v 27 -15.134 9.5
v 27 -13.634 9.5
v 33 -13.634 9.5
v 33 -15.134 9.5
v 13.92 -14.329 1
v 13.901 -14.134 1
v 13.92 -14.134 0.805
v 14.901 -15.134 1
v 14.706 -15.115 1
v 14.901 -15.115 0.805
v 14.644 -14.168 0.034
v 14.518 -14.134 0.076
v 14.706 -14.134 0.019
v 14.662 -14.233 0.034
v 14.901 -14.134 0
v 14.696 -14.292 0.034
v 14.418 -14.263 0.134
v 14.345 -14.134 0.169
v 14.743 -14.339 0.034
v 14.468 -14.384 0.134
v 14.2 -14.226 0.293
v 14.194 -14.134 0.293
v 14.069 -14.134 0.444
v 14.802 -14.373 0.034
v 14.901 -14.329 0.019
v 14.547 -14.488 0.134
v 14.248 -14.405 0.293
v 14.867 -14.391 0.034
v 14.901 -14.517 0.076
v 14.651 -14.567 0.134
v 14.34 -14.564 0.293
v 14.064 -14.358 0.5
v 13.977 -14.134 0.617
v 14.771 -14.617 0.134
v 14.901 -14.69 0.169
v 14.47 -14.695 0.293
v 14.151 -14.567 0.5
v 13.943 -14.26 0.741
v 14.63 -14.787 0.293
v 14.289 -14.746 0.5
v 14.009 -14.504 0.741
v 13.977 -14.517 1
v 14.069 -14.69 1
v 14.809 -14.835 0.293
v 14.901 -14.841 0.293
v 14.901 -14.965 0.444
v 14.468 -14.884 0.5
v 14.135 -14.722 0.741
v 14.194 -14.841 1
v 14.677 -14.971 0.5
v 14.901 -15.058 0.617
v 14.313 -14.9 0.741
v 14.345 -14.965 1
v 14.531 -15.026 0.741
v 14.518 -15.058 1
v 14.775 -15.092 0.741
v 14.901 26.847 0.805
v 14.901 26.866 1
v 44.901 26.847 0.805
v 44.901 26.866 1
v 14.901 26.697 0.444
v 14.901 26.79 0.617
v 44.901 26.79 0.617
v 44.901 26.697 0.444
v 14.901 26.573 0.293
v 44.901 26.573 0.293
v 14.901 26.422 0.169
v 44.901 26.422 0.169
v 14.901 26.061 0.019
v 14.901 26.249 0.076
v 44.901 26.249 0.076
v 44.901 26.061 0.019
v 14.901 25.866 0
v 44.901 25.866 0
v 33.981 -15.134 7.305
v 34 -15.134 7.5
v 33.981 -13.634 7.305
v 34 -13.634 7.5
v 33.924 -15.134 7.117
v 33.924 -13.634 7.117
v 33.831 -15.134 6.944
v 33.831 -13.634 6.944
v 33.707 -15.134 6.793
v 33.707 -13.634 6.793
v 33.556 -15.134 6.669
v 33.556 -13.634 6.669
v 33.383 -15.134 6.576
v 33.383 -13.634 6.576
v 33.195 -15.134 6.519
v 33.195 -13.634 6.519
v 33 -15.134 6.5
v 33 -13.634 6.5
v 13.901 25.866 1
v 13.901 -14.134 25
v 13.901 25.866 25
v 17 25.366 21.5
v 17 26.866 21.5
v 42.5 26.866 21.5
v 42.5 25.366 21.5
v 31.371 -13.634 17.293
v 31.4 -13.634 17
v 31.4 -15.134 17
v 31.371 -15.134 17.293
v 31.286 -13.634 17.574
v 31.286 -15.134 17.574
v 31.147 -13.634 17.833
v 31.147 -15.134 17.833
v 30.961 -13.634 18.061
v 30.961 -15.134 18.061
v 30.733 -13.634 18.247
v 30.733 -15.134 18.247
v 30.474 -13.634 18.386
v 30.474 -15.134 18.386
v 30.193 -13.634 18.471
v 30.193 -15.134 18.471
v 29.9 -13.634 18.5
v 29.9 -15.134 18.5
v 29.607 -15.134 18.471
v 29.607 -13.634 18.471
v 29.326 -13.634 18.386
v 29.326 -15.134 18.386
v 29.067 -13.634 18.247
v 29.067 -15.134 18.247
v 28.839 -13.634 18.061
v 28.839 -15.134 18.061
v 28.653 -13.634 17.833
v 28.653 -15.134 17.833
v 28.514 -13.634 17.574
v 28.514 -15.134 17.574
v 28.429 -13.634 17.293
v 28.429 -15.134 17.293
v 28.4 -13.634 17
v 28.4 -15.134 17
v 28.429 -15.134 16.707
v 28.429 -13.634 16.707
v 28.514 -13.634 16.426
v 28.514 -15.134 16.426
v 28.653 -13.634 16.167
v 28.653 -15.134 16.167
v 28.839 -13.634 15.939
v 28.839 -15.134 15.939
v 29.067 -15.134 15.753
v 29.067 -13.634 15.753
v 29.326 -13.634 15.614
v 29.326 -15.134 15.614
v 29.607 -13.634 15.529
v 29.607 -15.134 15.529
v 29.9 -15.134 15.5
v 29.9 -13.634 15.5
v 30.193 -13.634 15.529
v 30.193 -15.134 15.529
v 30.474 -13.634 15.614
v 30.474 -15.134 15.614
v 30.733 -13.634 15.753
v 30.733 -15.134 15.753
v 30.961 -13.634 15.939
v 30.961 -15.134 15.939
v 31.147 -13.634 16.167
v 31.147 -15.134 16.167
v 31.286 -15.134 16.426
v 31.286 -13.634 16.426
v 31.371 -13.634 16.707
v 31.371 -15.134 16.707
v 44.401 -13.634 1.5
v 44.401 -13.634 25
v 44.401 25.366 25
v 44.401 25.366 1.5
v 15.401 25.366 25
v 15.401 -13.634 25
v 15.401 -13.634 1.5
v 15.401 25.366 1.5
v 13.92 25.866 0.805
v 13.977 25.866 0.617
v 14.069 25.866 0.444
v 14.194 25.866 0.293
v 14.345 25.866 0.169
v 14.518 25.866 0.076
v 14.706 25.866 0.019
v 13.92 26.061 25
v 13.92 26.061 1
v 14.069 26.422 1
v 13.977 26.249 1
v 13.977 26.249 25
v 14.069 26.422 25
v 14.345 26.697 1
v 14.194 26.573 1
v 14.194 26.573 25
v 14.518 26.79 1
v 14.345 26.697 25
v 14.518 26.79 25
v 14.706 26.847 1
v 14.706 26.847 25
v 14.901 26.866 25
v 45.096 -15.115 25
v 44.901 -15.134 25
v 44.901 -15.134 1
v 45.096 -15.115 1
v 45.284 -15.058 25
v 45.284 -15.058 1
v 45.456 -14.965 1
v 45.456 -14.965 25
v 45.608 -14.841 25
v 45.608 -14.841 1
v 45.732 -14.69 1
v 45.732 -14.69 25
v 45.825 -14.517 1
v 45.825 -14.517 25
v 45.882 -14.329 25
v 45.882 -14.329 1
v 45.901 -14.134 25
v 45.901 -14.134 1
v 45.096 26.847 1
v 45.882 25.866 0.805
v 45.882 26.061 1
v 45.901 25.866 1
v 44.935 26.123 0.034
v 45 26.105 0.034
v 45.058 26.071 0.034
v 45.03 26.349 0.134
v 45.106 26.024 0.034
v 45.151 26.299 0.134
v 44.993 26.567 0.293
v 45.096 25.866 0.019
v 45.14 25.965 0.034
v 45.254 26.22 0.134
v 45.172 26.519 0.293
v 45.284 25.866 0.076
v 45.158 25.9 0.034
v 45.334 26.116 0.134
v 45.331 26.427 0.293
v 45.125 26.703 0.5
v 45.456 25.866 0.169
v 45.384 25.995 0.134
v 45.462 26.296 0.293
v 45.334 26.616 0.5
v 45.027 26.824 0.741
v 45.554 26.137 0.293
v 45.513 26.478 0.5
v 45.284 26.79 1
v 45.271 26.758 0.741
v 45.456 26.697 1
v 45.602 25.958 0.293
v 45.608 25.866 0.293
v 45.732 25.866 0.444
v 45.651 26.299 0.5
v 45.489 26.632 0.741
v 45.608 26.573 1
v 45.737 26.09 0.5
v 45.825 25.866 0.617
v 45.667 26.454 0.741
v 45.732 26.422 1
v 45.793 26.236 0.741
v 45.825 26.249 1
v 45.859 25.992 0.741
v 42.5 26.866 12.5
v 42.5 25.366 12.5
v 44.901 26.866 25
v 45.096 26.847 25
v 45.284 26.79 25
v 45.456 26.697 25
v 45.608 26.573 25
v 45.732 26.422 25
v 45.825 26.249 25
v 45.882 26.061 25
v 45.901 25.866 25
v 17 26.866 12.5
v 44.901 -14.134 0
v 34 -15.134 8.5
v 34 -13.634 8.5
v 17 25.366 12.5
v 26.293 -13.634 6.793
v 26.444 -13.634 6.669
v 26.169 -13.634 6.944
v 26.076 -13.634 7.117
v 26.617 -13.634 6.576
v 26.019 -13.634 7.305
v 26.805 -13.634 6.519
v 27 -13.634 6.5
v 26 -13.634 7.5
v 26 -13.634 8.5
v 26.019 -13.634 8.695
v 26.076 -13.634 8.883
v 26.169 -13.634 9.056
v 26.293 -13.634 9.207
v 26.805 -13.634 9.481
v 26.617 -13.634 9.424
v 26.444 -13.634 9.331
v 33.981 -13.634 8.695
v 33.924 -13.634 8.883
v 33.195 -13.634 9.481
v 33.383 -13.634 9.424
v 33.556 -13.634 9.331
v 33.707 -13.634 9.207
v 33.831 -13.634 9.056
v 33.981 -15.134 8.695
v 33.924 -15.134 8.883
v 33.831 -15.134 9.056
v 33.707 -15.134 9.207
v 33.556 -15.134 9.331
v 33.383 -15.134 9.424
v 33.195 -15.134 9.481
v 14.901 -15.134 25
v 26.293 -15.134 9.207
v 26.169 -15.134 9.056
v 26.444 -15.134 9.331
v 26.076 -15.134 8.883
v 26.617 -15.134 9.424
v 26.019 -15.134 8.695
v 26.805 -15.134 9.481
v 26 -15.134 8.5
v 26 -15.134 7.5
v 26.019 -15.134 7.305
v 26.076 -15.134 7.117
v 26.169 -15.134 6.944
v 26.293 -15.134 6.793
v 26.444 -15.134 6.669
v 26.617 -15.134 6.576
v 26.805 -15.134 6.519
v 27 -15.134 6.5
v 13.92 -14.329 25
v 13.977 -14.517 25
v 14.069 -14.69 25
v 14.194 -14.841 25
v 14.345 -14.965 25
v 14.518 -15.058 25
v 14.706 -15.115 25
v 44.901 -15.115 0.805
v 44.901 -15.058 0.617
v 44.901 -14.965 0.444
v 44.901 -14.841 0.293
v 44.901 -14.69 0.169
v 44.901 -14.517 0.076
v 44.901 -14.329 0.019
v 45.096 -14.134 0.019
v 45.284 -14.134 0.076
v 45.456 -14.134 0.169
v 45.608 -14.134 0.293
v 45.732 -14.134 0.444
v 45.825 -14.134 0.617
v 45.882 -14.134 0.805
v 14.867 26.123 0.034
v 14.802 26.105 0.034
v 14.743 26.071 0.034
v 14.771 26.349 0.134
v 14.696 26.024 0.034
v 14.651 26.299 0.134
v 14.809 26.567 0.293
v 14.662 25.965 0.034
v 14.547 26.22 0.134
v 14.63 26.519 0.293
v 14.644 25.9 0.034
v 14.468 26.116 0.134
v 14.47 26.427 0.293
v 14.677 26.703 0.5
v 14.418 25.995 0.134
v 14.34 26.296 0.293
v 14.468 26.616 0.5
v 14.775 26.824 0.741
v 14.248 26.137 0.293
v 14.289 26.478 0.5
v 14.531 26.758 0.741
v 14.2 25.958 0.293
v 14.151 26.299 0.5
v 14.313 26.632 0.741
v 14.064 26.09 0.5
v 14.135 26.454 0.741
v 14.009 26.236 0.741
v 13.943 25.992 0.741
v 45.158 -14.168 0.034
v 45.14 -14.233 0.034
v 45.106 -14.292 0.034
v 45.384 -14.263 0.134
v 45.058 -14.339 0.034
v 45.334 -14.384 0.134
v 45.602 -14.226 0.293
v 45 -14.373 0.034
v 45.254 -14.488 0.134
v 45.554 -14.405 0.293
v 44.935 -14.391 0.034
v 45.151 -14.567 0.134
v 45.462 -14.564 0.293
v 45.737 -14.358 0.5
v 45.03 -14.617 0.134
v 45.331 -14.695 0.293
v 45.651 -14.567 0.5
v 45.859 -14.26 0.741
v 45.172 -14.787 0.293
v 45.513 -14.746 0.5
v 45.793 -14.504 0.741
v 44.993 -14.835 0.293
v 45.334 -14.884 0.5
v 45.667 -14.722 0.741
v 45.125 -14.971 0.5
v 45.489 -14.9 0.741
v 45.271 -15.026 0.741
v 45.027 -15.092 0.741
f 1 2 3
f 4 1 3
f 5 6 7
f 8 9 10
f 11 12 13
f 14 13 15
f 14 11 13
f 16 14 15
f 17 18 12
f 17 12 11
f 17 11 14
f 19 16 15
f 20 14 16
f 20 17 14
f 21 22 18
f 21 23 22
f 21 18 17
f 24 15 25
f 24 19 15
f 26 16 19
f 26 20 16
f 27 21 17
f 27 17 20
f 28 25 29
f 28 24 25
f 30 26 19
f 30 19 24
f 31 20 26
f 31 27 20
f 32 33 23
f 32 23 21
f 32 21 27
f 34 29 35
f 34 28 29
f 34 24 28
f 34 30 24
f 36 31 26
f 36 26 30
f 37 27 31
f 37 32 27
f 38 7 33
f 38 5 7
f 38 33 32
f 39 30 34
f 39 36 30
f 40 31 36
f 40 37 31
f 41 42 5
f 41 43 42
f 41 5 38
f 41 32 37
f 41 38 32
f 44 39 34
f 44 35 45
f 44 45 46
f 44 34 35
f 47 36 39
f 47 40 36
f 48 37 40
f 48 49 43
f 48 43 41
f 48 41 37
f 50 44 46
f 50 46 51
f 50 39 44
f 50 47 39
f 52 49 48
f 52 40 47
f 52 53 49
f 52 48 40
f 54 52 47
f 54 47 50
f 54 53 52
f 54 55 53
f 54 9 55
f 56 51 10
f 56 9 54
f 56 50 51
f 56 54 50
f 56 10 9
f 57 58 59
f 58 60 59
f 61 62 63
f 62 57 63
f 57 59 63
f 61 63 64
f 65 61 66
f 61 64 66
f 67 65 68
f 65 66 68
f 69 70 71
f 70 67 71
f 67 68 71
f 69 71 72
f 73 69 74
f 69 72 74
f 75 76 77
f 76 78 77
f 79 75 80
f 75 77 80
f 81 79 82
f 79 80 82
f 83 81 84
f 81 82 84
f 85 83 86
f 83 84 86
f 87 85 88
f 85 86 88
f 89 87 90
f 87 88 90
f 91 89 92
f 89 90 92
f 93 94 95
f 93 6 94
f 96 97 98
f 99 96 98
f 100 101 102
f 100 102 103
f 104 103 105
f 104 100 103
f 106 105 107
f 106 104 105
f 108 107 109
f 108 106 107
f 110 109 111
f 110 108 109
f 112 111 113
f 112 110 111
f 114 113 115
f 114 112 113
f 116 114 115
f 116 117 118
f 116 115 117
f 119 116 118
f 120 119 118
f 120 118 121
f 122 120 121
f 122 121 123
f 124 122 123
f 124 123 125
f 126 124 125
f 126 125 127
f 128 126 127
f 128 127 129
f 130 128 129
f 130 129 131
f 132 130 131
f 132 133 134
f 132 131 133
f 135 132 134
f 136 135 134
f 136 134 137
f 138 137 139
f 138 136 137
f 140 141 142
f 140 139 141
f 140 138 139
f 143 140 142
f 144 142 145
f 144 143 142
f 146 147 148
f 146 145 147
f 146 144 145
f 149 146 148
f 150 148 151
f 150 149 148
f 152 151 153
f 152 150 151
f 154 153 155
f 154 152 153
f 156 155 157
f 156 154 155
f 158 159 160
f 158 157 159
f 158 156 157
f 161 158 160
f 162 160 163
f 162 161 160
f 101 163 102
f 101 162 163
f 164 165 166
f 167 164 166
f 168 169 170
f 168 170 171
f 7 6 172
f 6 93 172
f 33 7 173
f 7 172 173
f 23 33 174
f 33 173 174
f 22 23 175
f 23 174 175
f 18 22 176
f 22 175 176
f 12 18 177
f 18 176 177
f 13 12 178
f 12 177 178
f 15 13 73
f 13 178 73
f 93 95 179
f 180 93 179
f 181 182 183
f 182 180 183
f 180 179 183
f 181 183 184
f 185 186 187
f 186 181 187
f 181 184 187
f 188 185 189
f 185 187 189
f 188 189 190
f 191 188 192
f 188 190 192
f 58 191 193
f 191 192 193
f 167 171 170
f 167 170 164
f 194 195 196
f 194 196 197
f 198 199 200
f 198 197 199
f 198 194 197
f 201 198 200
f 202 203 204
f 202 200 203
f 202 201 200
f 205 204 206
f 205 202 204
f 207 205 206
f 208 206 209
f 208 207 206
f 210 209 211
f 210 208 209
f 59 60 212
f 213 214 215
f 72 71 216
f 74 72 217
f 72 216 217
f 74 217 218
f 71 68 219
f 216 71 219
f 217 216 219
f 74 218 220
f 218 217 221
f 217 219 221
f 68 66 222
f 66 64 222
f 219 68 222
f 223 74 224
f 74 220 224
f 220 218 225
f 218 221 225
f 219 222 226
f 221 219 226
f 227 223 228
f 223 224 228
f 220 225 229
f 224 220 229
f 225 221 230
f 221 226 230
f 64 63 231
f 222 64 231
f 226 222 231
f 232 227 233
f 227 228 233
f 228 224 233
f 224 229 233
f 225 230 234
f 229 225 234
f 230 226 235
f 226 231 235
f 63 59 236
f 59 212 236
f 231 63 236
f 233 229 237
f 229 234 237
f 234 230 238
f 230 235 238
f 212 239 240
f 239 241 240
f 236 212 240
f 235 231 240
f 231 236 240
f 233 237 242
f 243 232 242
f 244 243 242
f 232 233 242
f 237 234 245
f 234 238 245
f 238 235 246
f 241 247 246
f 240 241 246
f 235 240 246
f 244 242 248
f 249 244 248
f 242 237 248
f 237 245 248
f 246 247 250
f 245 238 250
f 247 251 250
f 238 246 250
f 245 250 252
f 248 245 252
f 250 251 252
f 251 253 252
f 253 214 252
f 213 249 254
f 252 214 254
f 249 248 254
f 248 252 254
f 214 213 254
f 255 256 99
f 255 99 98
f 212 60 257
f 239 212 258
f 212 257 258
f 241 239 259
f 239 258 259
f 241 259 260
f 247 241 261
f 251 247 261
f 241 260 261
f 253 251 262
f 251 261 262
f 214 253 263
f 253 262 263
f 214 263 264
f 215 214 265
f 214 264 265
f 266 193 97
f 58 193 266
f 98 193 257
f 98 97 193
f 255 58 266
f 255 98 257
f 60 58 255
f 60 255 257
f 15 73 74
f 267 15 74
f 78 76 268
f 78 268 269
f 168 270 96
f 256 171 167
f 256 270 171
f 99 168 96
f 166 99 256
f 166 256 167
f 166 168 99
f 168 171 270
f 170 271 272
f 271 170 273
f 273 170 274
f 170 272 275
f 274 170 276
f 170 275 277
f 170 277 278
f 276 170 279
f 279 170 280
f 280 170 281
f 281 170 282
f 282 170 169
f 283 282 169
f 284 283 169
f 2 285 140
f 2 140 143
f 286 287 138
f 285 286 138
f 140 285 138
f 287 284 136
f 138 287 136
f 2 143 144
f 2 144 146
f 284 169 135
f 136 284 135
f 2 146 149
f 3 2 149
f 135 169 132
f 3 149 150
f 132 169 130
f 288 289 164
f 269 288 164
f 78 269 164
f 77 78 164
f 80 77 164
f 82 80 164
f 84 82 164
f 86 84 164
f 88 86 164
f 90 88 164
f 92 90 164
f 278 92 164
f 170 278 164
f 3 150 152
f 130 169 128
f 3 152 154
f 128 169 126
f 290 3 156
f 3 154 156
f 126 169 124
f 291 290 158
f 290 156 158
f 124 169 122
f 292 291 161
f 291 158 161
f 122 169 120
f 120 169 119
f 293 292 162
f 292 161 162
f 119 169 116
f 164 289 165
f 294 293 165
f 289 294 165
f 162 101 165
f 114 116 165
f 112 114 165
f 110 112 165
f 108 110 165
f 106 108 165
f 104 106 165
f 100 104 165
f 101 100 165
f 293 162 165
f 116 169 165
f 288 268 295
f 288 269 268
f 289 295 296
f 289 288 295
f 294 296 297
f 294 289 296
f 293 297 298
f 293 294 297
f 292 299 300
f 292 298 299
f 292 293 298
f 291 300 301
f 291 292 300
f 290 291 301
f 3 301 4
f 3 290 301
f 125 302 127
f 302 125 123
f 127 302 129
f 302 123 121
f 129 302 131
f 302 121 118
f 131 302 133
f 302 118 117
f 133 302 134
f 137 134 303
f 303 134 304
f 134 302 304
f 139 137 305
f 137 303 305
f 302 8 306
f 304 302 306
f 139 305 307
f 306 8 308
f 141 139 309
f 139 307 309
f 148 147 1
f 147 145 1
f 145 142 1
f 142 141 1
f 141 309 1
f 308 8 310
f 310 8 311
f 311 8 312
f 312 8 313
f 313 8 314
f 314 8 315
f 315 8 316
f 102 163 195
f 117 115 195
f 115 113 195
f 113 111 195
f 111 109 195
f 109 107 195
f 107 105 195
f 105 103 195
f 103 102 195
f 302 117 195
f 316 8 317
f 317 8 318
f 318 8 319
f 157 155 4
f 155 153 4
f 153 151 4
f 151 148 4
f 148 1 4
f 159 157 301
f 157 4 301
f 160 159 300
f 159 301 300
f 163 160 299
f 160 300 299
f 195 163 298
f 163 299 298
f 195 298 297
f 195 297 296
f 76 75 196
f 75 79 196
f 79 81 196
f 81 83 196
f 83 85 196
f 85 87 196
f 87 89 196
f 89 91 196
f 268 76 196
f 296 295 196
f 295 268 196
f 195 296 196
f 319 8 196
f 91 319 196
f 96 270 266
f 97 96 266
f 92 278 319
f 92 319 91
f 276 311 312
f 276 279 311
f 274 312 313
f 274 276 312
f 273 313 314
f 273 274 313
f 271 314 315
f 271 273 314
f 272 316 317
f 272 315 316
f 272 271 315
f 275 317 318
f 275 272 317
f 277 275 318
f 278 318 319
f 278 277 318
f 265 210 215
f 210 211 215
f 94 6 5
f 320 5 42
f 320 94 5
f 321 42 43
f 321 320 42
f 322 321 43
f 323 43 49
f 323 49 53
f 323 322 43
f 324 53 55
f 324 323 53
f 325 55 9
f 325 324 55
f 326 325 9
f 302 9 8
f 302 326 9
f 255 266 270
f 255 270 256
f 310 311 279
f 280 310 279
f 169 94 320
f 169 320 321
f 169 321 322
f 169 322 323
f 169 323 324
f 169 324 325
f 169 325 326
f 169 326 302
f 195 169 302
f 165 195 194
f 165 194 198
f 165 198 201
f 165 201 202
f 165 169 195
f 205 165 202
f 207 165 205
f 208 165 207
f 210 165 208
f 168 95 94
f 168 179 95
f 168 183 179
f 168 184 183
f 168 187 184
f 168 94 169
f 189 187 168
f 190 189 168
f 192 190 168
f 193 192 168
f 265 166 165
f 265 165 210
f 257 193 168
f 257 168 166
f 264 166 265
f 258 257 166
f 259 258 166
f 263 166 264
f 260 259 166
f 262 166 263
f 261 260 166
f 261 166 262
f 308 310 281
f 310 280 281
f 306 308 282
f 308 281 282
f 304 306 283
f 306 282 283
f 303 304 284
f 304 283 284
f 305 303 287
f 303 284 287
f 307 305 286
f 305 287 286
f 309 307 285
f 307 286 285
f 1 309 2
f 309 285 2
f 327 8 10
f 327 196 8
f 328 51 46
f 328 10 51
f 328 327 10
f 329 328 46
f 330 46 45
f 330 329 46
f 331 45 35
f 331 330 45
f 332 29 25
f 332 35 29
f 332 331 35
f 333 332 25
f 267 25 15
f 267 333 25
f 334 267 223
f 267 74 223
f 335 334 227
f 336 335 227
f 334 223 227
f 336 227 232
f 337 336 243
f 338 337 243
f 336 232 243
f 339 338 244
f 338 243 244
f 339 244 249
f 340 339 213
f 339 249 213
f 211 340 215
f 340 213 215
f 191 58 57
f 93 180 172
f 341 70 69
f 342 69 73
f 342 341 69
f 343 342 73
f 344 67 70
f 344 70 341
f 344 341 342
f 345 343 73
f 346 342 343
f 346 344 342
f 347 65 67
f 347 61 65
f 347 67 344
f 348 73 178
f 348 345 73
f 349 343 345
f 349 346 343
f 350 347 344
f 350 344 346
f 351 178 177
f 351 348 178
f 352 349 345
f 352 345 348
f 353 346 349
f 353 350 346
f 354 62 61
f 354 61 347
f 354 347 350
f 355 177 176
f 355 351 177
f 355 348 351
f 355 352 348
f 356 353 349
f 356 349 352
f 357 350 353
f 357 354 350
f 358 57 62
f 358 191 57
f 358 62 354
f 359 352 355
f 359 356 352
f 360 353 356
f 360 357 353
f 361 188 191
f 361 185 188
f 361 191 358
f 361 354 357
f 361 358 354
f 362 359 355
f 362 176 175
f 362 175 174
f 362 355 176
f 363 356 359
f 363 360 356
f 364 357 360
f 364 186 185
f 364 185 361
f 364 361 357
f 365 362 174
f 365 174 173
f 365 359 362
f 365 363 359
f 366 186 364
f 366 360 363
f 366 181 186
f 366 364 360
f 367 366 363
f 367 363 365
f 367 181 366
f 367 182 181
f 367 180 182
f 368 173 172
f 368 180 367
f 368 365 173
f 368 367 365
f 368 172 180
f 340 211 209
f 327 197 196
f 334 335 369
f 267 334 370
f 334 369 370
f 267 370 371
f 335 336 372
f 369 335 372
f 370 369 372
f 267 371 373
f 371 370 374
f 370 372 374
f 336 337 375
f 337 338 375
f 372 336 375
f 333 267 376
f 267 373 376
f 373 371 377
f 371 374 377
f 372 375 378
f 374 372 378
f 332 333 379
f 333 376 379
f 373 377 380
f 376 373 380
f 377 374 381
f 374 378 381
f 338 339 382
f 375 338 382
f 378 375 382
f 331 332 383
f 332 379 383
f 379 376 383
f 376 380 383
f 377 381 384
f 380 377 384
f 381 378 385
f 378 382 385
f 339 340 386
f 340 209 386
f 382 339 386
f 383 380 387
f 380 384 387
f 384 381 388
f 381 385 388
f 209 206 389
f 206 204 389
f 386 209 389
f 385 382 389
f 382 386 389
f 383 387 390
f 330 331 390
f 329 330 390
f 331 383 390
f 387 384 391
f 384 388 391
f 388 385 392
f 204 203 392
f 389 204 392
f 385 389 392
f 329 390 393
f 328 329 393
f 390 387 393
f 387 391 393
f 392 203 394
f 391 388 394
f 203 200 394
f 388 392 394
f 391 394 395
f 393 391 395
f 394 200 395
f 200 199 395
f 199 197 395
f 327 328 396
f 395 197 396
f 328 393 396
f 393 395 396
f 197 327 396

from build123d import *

# Parameters (mm, degrees)
BOX003_W            = 8
BOX003_H            = 6
BOX003_DEPTH        = 3
FILLET003_R         = 1
BOX004_W            = 25.5
BOX004_H            = 5
BOX004_DEPTH        = 9
CYLINDER_R          = 1.5
CYLINDER_DEPTH      = 3.5
CYLINDER_ROLL_ANGLE = 90
SKETCH_W            = 32
SKETCH_H            = 42
PAD_DEPTH           = 25
SKETCH001_W         = 29
SKETCH001_H         = 39
POCKET_DEPTH        = 23.5
FILLET001_R         = 1


with BuildPart() as fillet003:
    # Box003 → Box003 (new body)
    with BuildSketch(Plane(origin=(26, -16, 6.5), x_dir=(1, 0, 0), z_dir=(0, 0, 1))):
        with Locations((4, 3)):
            Rectangle(BOX003_W, BOX003_H)
    extrude(amount=BOX003_DEPTH)

    # Fillet003
    fillet003_edges = [fillet003.edges().sort_by_distance(p)[0] for p in [
        (26, -16, 8),
        (26, -13, 9.5),
        (26, -10, 8),
        (26, -13, 6.5),
        (34, -16, 8),
        (34, -13, 9.5),
        (34, -10, 8),
        (34, -13, 6.5),
        (30, -16, 6.5),
        (30, -16, 9.5),
        (30, -10, 6.5),
        (30, -10, 9.5),
    ]]
    fillet(fillet003_edges, radius=FILLET003_R)


with BuildPart() as fillet003_1:
    # Fillet003 placement: moved
    add(fillet003.part.moved(Location((0, -1, 0))))


with BuildPart() as cubo001:
    # Box004 → Box004 (new body)
    with BuildSketch(Plane(origin=(17, 24, 12.5), x_dir=(1, 0, 0), z_dir=(0, 0, 1))):
        with Locations((12.75, 2.5)):
            Rectangle(BOX004_W, BOX004_H)
    extrude(amount=BOX004_DEPTH)


with BuildPart() as holes:
    # Cylinder → Cylinder (new body)
    with BuildSketch(Plane.XY):
        Circle(CYLINDER_R)
    extrude(amount=CYLINDER_DEPTH)


with BuildPart() as holes_1:
    # Cylinder roll: moved
    add(holes.part.rotate(Axis((0, 0, 0), (1, 0, 0)), CYLINDER_ROLL_ANGLE))


with BuildPart() as holes_2:
    # Cylinder placement: moved
    add(holes_1.part.moved(Location((29.9, -12.65, 17))))

    # Fusion001: union Fillet003, Cubo001
    add(fillet003_1.part)
    add(cubo001.part)


with BuildPart() as cabinet_drilled:
    # Sketch → Pad (new body)
    with BuildSketch(Plane.XY):
        with Locations((29.906403, 6.669162)):
            Rectangle(SKETCH_W, SKETCH_H)
    extrude(amount=PAD_DEPTH)

    # Sketch001 (on Face6 of Pad) → Pocket (cut)
    with BuildSketch(Plane.XY.offset(25)):
        with Locations((29.906403, 6.669162)):
            Rectangle(SKETCH001_W, SKETCH001_H)
    extrude(amount=-POCKET_DEPTH, mode=Mode.SUBTRACT)

    # Fillet001
    fillet001_edges = [cabinet_drilled.edges().sort_by_distance(p)[0] for p in [
        (13.906403, 27.669162, 12.5),
        (45.906403, 27.669162, 12.5),
        (29.906403, 27.669162, 0),
        (13.906403, -14.330838, 12.5),
        (13.906403, 6.669162, 0),
        (45.906403, -14.330838, 12.5),
        (45.906403, 6.669162, 0),
        (29.906403, -14.330838, 0),
    ]]
    fillet(fillet001_edges, radius=FILLET001_R)


with BuildPart() as cabinet_drilled_1:
    # Fillet001 placement: moved
    add(cabinet_drilled.part.moved(Location((-0.005501, -0.803173, 0))))

    # Cut: cut Holes
    add(holes_2.part, mode=Mode.SUBTRACT)


solid = cabinet_drilled_1.part
